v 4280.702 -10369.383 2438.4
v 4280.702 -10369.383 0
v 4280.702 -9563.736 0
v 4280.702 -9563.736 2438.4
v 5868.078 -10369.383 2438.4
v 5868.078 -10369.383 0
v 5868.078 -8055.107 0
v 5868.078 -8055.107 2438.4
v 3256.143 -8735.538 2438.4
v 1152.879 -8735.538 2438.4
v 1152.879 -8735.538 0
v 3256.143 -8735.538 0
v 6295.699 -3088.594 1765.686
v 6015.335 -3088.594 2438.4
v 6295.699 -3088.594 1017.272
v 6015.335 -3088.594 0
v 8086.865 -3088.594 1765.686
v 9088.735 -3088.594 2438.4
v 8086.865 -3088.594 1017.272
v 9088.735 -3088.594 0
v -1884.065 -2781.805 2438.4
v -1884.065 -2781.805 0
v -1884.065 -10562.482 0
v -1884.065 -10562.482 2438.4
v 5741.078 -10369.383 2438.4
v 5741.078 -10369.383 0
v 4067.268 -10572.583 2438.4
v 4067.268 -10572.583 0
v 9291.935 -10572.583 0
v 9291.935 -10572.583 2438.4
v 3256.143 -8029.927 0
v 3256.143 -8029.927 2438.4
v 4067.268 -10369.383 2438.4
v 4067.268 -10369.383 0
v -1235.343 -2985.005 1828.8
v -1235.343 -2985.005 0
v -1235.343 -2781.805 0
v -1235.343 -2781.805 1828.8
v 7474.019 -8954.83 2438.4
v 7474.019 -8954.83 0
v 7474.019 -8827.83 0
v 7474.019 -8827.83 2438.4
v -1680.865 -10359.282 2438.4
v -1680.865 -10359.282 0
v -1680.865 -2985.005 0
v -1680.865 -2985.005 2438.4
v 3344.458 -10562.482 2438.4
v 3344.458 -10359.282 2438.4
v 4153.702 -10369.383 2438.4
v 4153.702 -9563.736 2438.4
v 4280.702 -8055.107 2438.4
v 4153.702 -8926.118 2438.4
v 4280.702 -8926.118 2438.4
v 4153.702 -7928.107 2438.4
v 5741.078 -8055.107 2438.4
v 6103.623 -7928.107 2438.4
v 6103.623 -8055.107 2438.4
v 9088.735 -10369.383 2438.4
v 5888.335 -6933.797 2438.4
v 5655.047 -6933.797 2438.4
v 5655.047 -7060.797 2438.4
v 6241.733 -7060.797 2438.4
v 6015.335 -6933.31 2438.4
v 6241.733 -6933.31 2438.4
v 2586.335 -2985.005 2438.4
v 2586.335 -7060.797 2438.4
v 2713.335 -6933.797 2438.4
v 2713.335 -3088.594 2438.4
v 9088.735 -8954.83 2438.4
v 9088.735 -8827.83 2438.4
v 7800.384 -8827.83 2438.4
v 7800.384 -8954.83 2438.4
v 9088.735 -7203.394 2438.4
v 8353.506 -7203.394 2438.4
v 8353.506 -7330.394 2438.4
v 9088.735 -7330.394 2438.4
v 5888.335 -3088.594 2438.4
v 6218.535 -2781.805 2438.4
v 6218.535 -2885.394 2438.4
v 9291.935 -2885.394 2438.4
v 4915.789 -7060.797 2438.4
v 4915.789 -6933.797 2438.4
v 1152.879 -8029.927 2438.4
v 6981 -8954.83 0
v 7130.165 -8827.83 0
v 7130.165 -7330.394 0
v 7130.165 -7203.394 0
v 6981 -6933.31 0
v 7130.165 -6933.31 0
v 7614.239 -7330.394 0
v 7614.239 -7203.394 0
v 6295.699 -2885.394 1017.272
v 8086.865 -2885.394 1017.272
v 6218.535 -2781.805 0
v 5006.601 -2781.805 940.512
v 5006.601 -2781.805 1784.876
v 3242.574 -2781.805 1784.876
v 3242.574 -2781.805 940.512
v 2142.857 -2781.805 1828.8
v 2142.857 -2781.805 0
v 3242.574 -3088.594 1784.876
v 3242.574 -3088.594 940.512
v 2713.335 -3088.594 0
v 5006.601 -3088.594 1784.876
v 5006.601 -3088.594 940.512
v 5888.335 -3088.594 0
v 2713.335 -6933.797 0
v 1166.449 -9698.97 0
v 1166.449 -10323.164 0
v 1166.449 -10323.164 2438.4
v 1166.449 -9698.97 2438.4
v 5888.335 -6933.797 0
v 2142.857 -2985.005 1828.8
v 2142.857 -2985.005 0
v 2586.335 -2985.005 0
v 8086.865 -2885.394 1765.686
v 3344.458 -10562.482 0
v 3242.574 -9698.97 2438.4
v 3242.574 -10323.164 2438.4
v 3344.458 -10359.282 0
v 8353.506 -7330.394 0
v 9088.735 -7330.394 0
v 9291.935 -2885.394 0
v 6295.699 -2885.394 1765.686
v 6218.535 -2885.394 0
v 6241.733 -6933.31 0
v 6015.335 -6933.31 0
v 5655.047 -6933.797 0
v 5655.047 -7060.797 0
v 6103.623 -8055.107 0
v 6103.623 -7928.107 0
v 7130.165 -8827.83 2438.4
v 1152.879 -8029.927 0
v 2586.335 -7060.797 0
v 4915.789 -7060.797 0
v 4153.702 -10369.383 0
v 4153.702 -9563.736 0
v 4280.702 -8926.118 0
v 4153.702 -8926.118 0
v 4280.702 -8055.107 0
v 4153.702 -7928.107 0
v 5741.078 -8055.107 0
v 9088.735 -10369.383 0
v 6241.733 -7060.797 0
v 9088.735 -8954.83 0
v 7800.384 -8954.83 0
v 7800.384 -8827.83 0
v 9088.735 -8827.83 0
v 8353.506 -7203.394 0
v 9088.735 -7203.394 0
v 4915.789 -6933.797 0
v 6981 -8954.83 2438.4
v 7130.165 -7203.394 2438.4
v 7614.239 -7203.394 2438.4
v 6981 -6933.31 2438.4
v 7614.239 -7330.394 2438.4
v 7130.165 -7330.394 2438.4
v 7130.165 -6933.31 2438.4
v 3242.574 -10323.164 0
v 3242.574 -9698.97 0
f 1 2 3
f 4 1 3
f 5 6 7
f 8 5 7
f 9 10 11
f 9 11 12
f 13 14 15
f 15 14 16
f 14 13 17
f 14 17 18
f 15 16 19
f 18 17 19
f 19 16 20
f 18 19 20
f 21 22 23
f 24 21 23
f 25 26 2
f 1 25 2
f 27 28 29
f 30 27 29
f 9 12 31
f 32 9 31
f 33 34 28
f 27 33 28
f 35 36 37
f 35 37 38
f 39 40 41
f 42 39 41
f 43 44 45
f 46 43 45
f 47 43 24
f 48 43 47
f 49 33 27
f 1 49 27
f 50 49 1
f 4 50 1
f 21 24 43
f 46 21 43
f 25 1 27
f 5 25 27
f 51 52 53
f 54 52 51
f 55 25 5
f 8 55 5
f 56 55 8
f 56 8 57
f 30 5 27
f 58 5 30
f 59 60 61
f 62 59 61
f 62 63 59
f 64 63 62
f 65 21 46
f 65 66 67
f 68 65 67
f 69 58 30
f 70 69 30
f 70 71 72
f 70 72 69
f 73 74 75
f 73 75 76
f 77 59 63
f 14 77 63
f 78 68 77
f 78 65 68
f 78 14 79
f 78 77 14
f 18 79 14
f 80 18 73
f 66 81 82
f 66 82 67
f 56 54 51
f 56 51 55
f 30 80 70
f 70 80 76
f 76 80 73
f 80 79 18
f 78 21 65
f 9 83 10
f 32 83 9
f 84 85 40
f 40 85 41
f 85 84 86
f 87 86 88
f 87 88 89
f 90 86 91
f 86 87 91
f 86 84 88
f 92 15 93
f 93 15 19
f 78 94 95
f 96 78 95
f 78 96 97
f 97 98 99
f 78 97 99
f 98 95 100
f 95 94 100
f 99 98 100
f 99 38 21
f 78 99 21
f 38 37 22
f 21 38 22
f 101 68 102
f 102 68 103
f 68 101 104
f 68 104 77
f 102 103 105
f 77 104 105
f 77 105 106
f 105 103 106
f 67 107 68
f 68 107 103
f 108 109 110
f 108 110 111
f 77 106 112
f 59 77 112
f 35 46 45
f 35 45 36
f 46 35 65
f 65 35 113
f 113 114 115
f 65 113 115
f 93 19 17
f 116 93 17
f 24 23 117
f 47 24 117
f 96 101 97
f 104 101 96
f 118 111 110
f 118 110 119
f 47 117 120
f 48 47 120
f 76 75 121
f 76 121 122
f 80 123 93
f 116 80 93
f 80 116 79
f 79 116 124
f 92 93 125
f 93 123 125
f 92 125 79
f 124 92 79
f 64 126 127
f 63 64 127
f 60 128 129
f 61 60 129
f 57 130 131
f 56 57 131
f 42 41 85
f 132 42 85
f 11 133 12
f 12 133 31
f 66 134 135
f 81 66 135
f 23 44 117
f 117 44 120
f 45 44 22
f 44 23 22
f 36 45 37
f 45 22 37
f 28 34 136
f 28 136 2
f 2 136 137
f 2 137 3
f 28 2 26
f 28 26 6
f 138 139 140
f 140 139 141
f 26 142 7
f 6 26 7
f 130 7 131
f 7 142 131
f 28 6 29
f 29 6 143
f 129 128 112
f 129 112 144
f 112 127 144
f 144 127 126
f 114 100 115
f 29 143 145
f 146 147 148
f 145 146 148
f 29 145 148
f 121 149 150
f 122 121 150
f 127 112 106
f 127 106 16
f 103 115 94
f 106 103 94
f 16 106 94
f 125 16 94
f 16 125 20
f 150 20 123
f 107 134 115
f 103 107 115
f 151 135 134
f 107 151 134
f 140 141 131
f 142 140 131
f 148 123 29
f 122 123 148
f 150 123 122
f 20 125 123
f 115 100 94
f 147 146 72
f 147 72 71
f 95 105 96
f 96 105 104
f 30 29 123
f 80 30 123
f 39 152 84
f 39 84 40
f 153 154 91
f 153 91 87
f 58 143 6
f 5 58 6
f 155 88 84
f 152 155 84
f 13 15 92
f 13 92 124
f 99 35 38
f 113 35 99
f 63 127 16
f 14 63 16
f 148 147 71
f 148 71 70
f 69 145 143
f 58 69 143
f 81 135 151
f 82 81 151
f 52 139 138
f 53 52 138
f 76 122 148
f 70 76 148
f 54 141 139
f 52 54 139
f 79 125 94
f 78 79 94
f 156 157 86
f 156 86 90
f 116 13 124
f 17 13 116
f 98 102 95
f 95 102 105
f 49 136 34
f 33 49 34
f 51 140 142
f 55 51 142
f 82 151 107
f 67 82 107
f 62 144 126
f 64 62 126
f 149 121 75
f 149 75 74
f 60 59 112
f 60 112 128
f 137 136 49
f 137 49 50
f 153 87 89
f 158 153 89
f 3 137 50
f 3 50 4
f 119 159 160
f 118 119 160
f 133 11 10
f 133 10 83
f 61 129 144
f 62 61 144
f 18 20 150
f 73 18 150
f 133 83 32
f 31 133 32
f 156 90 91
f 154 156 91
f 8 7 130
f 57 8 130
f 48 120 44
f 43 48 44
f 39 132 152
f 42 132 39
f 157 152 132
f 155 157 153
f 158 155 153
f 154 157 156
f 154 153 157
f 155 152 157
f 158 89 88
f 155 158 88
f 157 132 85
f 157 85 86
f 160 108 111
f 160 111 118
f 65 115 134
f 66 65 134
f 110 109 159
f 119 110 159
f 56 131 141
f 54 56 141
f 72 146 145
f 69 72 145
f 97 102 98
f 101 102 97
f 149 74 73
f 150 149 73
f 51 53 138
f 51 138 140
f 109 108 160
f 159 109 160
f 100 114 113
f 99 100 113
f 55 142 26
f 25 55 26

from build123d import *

# Parameters (mm, degrees)
F0_W     = 127
F0_H     = 805.6468963623
F0_W_2   = 735.2284367638
F0_H_2   = 127
F0_W_3   = 1288.3506079674
F1_DEPTH = 2438.4
F2_W     = 3378.2
F2_H     = 1828.8
F3_DEPTH = 203.2
F5_W     = 1791.1667823792
F5_H     = 748.4134435654
F4_W     = 1764.02759552
F4_H     = 844.3640470505
F6_DEPTH = 306.7898195038
F7_W     = 2103.2639741898
F7_H     = 705.6112289429
F8_DEPTH = 2438.4
F7_W_2   = 2076.1250257492
F7_H_2   = 624.1941452026


with BuildPart() as f1:
    # F0 (on Top) → F1 (new body)
    with BuildSketch(Plane.XY):
        Polygon((-1680.8653473854, -10359.281539917), (-1680.8653473854, -2985.0053787231), (2586.3346526146, -2985.0053787231), (2586.3346526146, -7060.7972145081), (4915.788742733, -7060.7972145081), (4915.788742733, -6933.7972145081), (2713.3346526146, -6933.7972145081), (2713.3346526146, -3088.5941982269), (5888.3346526146, -3088.5941982269), (5888.3346526146, -6933.7972145081), (5655.046555233, -6933.7972145081), (5655.046555233, -7060.7972145081), (6241.732643795, -7060.7972145081), (6241.732643795, -6933.3100318909), (6015.3346526146, -6933.3100318909), (6015.3346526146, -3088.5941982269), (9088.7346526146, -3088.5941982269), (9088.7346526146, -7203.3941982269), (9088.7346526146, -7330.3941982269), (9088.7346526146, -8827.8301696777), (9088.7346526146, -8954.8301696777), (9088.7346526146, -10369.3828582764), (5868.0778999329, -10369.3828582764), (5741.0778999329, -10369.3828582764), (4280.7017822266, -10369.3828582764), (4153.7017822266, -10369.3828582764), (4067.268371582, -10369.3828582764), (4067.268371582, -10572.5828582764), (9291.9346526146, -10572.5828582764), (9291.9346526146, -2885.3941982269), (6218.5346526146, -2885.3941982269), (6218.5346526146, -2781.8053787231), (-1884.0653473854, -2781.8053787231), (-1884.0653473854, -10562.481539917), (3344.4576263428, -10562.481539917), (3344.4576263428, -10359.281539917), align=None)
        with Locations((4217.2017822266, -9966.5594100952)):
            Rectangle(F0_W, F0_H)
        Polygon((5741.0778999329, -8055.1072616577), (5741.0778999329, -10369.3828582764), (5868.0778999329, -10369.3828582764), (5868.0778999329, -8055.1072616577), (6103.6233901978, -8055.1072616577), (6103.6233901978, -7928.1072616577), (4153.7017822266, -7928.1072616577), (4153.7017822266, -8926.1178970337), (4280.7017822266, -8926.1178970337), (4280.7017822266, -8055.1072616577), align=None)
        with Locations((8721.1204342327, -7266.8941982269)):
            Rectangle(F0_W_2, F0_H_2)
        with Locations((8444.5593486309, -8891.3301696777)):
            Rectangle(F0_W_3, F0_H_2)
    extrude(amount=F1_DEPTH)

    # F2 (on face) → F3 (cut, through all)
    with BuildSketch(Plane.XZ.offset(2985.0053787231)):
        with Locations((453.7567821503, 914.4)):
            Rectangle(F2_W, F2_H)
    extrude(amount=-F3_DEPTH, mode=Mode.SUBTRACT)

    # F5 (on face) + F4 (on face) → F6 (cut, through all)
    with BuildSketch(Plane.XZ.offset(3088.5941982269)):
        with Locations((7191.2820339203, 1391.4791941643)):
            Rectangle(F5_W, F5_H)
    with BuildSketch(Plane.XZ.offset(3088.5941982269)):
        with Locations((4124.5875358582, 1362.6937270164)):
            Rectangle(F4_W, F4_H)
    extrude(amount=-F6_DEPTH, mode=Mode.SUBTRACT)


with BuildPart() as f1b:
    # F0 (on Top) → F1, piece 2 (new body)
    with BuildSketch(Plane.XY):
        Polygon((7130.1646232605, -6933.3100318909), (6980.999643795, -6933.3100318909), (6980.999643795, -7060.3100318909), (6980.999643795, -8954.8301696777), (7474.0190505981, -8954.8301696777), (7474.0190505981, -8827.8301696777), (7130.1646232605, -8827.8301696777), (7130.1646232605, -7330.3941982269), (7614.2392158508, -7330.3941982269), (7614.2392158508, -7203.3941982269), (7130.1646232605, -7203.3941982269), align=None)
    extrude(amount=F1_DEPTH)


with BuildPart() as f8:
    # F7 (on Top) → F8 (new body)
    with BuildSketch(Plane.XY):
        with Locations((2204.5111060143, -8382.7328681946)):
            Rectangle(F7_W, F7_H)
    extrude(amount=F8_DEPTH)


with BuildPart() as f8b:
    # F7 (on Top) → F8, piece 2 (new body)
    with BuildSketch(Plane.XY):
        with Locations((2204.5112252235, -10011.0669136047)):
            Rectangle(F7_W_2, F7_H_2)
    extrude(amount=F8_DEPTH)


solid = Compound([f1.part, f1b.part, f8.part, f8b.part])
